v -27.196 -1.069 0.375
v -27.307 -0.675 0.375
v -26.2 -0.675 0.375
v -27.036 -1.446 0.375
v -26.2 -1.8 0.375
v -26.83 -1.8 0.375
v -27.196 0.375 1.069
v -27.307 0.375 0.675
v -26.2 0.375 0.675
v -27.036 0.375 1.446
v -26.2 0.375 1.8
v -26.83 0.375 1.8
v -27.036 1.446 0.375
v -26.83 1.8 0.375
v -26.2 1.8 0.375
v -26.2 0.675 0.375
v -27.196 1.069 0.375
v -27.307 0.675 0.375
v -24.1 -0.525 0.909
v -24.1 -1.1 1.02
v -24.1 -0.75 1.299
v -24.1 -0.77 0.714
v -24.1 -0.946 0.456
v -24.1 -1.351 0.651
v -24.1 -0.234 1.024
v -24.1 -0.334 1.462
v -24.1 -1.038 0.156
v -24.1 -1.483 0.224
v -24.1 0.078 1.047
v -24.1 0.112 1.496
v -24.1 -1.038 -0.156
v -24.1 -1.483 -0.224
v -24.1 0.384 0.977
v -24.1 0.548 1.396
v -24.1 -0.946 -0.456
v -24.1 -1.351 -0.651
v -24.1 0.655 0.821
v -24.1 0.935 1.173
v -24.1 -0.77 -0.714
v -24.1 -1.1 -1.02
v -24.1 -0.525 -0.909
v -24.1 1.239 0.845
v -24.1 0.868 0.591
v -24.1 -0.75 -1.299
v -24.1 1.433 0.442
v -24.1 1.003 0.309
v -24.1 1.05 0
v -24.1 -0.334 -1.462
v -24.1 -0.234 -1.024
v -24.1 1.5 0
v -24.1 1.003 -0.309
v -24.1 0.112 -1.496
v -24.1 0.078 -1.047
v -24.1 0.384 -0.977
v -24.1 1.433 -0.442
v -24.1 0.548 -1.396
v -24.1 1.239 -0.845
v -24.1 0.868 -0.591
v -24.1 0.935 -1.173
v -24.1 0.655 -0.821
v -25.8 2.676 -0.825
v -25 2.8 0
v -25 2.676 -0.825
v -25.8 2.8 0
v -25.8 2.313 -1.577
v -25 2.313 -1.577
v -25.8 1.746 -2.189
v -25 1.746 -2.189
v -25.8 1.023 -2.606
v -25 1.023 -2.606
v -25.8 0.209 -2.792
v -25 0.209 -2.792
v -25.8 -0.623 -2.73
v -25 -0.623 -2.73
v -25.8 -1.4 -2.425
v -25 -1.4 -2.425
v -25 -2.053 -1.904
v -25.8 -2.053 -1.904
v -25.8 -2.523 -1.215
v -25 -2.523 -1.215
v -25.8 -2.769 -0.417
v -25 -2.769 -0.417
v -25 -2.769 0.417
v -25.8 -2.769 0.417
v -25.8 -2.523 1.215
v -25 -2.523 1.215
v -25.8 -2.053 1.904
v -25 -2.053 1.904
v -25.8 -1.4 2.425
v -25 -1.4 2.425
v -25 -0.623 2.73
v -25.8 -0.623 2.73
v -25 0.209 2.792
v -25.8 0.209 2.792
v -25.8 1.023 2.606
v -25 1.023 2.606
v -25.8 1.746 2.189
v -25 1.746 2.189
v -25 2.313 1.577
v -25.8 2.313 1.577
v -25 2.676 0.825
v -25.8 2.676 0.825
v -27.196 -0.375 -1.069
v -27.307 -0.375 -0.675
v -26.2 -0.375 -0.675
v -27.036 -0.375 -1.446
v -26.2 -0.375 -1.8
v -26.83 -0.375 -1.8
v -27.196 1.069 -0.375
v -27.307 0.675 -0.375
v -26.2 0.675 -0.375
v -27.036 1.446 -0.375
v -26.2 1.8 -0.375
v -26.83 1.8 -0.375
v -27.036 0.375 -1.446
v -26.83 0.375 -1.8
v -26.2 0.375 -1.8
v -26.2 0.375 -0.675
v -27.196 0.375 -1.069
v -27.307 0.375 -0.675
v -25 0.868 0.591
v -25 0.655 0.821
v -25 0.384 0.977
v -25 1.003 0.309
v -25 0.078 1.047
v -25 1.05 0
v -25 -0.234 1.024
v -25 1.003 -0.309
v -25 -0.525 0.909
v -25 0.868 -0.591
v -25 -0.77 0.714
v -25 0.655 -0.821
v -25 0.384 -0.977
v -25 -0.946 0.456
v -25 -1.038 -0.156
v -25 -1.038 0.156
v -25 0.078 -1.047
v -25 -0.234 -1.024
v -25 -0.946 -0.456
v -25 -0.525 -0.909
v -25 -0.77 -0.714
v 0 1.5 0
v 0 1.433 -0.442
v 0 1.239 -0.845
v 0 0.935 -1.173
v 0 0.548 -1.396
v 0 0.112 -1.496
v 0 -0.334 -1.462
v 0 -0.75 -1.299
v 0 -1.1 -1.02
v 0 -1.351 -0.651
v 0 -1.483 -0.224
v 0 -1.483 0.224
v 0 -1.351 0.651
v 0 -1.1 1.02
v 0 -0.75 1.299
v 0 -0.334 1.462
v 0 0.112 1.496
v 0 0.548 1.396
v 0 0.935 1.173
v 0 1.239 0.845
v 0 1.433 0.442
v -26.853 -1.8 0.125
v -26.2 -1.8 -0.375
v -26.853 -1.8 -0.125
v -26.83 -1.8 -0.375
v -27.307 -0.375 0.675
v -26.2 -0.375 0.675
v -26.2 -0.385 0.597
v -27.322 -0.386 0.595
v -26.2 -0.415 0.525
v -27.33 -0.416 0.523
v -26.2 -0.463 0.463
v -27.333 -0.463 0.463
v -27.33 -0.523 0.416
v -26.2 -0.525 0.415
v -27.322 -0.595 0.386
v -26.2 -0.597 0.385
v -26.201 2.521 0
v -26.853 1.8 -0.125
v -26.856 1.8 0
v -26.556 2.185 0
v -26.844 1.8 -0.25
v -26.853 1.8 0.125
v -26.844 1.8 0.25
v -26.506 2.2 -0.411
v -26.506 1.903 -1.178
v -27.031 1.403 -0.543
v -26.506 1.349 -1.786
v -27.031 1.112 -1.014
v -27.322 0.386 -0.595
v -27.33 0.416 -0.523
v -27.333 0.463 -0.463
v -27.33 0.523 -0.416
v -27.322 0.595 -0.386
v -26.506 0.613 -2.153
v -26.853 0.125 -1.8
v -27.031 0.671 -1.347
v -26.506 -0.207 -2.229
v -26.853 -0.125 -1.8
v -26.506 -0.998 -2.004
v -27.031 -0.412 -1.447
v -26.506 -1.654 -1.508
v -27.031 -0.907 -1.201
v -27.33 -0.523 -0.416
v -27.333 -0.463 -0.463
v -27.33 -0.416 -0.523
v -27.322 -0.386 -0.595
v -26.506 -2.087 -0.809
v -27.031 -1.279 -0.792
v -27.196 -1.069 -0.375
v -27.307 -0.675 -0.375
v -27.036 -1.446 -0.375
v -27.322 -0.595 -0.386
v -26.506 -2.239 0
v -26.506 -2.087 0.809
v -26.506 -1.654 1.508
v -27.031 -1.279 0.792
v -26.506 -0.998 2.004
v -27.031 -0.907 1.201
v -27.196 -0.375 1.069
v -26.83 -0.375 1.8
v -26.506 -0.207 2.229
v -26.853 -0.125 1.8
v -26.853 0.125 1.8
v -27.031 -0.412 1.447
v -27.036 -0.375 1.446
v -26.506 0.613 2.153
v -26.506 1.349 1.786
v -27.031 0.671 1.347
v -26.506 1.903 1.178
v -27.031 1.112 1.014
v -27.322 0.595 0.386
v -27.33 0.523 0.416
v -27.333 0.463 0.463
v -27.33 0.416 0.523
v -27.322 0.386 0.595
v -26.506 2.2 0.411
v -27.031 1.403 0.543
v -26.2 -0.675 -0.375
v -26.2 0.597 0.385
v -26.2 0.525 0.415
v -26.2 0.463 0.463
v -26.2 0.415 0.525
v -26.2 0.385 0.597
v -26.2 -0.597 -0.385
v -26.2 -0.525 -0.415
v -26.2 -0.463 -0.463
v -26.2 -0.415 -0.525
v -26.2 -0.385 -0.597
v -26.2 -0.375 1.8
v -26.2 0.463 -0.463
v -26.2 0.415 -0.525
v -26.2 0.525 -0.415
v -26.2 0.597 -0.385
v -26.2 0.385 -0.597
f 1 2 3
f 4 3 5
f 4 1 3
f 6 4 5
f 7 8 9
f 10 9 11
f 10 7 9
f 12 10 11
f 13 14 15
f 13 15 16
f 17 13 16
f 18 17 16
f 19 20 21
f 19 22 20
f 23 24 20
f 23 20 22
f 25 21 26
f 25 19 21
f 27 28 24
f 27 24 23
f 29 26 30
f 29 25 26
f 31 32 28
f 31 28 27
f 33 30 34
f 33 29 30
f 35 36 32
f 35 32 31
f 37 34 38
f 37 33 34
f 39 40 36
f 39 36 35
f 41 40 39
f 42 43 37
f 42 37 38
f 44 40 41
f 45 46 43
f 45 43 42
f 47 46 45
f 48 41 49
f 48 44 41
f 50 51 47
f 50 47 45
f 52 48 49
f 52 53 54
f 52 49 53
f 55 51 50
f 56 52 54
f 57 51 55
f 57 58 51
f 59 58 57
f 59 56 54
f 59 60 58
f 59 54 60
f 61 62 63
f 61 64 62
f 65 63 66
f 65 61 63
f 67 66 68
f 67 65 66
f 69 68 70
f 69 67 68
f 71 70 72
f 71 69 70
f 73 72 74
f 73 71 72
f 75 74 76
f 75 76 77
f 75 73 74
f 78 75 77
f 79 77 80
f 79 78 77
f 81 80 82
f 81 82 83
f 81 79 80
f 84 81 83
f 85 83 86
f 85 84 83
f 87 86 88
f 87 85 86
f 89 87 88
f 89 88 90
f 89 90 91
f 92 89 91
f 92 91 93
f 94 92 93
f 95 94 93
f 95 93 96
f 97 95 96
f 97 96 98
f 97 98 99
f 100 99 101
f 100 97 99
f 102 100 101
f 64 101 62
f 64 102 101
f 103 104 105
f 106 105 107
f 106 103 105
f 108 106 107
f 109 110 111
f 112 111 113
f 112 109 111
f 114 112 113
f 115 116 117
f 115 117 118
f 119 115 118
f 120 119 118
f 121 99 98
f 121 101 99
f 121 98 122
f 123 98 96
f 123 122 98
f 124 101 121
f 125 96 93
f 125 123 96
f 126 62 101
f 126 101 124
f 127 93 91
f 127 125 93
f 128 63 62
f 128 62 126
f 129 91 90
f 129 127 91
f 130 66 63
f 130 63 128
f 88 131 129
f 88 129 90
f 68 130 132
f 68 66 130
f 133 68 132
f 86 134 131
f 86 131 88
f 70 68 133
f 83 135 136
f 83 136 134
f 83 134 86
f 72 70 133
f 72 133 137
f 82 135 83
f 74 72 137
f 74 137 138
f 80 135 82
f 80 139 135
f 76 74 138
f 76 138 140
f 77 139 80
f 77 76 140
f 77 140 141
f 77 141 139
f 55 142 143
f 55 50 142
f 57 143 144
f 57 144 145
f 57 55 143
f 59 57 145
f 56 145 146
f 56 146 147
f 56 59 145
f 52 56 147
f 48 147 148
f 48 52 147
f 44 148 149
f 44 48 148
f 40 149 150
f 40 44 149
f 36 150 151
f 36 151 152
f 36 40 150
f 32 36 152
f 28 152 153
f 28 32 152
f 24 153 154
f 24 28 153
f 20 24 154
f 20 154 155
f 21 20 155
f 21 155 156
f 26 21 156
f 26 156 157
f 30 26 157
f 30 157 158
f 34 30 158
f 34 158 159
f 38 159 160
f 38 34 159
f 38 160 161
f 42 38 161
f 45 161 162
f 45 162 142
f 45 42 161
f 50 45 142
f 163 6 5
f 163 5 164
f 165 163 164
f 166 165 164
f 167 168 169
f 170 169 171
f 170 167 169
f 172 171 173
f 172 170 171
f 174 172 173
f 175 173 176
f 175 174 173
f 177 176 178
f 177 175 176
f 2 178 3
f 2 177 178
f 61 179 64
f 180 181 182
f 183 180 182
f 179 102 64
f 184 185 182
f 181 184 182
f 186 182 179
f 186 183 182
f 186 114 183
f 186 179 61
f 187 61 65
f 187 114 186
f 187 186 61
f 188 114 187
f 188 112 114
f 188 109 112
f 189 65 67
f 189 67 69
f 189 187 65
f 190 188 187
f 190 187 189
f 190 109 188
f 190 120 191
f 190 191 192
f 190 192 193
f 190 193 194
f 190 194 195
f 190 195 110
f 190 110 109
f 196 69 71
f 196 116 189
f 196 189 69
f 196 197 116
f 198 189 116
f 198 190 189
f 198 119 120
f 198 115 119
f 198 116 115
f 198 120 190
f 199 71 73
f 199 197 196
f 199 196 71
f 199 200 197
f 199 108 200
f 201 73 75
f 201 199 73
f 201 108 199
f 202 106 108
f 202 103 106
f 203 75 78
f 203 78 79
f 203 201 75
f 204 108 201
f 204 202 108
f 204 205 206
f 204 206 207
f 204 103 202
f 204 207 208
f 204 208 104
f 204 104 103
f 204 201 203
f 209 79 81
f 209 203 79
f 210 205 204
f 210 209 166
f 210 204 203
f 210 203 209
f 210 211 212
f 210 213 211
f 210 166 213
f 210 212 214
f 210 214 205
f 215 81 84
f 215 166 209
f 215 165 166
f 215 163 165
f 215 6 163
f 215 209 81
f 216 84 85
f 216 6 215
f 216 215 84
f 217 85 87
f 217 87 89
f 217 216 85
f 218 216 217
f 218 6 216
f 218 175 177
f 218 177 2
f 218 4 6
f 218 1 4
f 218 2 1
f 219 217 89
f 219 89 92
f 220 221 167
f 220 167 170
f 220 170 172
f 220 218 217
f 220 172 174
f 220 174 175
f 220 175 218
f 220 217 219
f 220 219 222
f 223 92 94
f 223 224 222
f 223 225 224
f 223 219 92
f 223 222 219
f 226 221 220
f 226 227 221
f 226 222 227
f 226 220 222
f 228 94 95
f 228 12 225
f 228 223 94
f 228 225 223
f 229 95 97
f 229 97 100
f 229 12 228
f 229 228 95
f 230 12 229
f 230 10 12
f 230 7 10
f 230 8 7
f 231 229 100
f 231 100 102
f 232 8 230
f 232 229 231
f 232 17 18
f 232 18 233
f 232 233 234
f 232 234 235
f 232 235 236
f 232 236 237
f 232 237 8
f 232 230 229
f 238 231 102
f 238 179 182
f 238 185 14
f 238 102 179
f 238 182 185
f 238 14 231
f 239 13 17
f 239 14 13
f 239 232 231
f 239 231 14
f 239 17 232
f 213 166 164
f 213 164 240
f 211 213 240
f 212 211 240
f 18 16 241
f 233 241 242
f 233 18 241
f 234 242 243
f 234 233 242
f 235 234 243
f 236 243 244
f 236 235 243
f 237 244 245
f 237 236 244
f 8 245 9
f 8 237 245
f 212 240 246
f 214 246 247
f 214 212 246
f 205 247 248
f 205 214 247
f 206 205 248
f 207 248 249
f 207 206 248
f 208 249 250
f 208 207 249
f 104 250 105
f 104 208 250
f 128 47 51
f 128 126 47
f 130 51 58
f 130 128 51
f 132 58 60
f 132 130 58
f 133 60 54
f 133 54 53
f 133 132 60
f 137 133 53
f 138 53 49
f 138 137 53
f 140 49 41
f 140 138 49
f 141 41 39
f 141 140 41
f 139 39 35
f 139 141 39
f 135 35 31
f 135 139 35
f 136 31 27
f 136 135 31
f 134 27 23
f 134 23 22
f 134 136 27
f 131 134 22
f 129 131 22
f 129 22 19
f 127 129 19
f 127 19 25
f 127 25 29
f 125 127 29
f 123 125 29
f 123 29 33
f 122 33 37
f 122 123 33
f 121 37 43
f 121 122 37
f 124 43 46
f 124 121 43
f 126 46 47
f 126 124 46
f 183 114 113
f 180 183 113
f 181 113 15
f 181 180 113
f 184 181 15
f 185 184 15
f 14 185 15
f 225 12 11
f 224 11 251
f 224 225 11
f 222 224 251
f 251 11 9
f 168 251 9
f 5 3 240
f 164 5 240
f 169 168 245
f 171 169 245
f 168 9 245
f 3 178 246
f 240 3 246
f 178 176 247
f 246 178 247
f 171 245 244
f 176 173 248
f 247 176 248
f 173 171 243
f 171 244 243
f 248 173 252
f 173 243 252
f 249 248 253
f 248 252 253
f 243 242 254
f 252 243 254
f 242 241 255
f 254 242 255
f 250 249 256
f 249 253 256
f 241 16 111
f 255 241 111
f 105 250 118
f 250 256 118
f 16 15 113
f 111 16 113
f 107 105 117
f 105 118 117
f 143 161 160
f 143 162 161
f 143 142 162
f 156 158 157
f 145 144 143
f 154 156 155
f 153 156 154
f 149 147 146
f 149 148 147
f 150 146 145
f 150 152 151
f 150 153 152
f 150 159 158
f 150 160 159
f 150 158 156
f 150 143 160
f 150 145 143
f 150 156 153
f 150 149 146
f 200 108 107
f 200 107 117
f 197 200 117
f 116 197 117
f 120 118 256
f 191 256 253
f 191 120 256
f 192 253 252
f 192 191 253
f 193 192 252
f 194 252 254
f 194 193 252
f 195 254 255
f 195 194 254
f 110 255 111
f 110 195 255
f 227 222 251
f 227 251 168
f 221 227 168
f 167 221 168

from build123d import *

# Parameters (mm, degrees)
CUT_EXTRUDE_5_DEPTH = 1.2


with BuildPart() as part:
    # 草图2 → 旋转1 (revolve)
    with BuildSketch(Plane.XY):
        with BuildLine():
            Line((0, 0), (0, 1.5))
            Line((0, 1.5), (-24.1, 1.5))
            Line((-24.1, 1.5), (-24.1, 1.05))
            Line((-24.1, 1.05), (-25, 1.05))
            Line((-25, 1.05), (-25, 2.8))
            Line((-25, 2.8), (-25.8, 2.8))
            ThreePointArc((-25.8, 2.8), (-26.971790212, 1.61245155), (-27.4, 0))
            Line((-27.4, 0), (0, 0))
        make_face()
    revolve(axis=Axis((0, 0, 0), (-1, 0, 0)))

    # 草图3 → 切除-拉伸5 (cut)
    with BuildSketch(Plane(origin=(-27.4, 0, 0), x_dir=(0, 0, -1), z_dir=(1, 0, 0))):
        with BuildLine():
            Line((0.375, 1.8), (-0.375, 1.8))
            Line((-0.375, 1.8), (-0.375, 0.675))
            ThreePointArc((-0.375, 0.675), (-0.462867966, 0.462867966), (-0.675, 0.375))
            Line((-0.675, 0.375), (-1.8, 0.375))
            Line((-1.8, 0.375), (-1.8, -0.375))
            Line((-1.8, -0.375), (-0.675, -0.375))
            ThreePointArc((-0.675, -0.375), (-0.462867966, -0.462867966), (-0.375, -0.675))
            Line((-0.375, -0.675), (-0.375, -1.8))
            Line((-0.375, -1.8), (0.375, -1.8))
            Line((0.375, -1.8), (0.375, -0.675))
            ThreePointArc((0.375, -0.675), (0.462867966, -0.462867966), (0.675, -0.375))
            Line((0.675, -0.375), (1.8, -0.375))
            Line((1.8, -0.375), (1.8, 0.375))
            Line((1.8, 0.375), (0.675, 0.375))
            ThreePointArc((0.675, 0.375), (0.462867966, 0.462867966), (0.375, 0.675))
            Line((0.375, 0.675), (0.375, 1.8))
        make_face()
    extrude(amount=CUT_EXTRUDE_5_DEPTH, mode=Mode.SUBTRACT)


solid = part.part
